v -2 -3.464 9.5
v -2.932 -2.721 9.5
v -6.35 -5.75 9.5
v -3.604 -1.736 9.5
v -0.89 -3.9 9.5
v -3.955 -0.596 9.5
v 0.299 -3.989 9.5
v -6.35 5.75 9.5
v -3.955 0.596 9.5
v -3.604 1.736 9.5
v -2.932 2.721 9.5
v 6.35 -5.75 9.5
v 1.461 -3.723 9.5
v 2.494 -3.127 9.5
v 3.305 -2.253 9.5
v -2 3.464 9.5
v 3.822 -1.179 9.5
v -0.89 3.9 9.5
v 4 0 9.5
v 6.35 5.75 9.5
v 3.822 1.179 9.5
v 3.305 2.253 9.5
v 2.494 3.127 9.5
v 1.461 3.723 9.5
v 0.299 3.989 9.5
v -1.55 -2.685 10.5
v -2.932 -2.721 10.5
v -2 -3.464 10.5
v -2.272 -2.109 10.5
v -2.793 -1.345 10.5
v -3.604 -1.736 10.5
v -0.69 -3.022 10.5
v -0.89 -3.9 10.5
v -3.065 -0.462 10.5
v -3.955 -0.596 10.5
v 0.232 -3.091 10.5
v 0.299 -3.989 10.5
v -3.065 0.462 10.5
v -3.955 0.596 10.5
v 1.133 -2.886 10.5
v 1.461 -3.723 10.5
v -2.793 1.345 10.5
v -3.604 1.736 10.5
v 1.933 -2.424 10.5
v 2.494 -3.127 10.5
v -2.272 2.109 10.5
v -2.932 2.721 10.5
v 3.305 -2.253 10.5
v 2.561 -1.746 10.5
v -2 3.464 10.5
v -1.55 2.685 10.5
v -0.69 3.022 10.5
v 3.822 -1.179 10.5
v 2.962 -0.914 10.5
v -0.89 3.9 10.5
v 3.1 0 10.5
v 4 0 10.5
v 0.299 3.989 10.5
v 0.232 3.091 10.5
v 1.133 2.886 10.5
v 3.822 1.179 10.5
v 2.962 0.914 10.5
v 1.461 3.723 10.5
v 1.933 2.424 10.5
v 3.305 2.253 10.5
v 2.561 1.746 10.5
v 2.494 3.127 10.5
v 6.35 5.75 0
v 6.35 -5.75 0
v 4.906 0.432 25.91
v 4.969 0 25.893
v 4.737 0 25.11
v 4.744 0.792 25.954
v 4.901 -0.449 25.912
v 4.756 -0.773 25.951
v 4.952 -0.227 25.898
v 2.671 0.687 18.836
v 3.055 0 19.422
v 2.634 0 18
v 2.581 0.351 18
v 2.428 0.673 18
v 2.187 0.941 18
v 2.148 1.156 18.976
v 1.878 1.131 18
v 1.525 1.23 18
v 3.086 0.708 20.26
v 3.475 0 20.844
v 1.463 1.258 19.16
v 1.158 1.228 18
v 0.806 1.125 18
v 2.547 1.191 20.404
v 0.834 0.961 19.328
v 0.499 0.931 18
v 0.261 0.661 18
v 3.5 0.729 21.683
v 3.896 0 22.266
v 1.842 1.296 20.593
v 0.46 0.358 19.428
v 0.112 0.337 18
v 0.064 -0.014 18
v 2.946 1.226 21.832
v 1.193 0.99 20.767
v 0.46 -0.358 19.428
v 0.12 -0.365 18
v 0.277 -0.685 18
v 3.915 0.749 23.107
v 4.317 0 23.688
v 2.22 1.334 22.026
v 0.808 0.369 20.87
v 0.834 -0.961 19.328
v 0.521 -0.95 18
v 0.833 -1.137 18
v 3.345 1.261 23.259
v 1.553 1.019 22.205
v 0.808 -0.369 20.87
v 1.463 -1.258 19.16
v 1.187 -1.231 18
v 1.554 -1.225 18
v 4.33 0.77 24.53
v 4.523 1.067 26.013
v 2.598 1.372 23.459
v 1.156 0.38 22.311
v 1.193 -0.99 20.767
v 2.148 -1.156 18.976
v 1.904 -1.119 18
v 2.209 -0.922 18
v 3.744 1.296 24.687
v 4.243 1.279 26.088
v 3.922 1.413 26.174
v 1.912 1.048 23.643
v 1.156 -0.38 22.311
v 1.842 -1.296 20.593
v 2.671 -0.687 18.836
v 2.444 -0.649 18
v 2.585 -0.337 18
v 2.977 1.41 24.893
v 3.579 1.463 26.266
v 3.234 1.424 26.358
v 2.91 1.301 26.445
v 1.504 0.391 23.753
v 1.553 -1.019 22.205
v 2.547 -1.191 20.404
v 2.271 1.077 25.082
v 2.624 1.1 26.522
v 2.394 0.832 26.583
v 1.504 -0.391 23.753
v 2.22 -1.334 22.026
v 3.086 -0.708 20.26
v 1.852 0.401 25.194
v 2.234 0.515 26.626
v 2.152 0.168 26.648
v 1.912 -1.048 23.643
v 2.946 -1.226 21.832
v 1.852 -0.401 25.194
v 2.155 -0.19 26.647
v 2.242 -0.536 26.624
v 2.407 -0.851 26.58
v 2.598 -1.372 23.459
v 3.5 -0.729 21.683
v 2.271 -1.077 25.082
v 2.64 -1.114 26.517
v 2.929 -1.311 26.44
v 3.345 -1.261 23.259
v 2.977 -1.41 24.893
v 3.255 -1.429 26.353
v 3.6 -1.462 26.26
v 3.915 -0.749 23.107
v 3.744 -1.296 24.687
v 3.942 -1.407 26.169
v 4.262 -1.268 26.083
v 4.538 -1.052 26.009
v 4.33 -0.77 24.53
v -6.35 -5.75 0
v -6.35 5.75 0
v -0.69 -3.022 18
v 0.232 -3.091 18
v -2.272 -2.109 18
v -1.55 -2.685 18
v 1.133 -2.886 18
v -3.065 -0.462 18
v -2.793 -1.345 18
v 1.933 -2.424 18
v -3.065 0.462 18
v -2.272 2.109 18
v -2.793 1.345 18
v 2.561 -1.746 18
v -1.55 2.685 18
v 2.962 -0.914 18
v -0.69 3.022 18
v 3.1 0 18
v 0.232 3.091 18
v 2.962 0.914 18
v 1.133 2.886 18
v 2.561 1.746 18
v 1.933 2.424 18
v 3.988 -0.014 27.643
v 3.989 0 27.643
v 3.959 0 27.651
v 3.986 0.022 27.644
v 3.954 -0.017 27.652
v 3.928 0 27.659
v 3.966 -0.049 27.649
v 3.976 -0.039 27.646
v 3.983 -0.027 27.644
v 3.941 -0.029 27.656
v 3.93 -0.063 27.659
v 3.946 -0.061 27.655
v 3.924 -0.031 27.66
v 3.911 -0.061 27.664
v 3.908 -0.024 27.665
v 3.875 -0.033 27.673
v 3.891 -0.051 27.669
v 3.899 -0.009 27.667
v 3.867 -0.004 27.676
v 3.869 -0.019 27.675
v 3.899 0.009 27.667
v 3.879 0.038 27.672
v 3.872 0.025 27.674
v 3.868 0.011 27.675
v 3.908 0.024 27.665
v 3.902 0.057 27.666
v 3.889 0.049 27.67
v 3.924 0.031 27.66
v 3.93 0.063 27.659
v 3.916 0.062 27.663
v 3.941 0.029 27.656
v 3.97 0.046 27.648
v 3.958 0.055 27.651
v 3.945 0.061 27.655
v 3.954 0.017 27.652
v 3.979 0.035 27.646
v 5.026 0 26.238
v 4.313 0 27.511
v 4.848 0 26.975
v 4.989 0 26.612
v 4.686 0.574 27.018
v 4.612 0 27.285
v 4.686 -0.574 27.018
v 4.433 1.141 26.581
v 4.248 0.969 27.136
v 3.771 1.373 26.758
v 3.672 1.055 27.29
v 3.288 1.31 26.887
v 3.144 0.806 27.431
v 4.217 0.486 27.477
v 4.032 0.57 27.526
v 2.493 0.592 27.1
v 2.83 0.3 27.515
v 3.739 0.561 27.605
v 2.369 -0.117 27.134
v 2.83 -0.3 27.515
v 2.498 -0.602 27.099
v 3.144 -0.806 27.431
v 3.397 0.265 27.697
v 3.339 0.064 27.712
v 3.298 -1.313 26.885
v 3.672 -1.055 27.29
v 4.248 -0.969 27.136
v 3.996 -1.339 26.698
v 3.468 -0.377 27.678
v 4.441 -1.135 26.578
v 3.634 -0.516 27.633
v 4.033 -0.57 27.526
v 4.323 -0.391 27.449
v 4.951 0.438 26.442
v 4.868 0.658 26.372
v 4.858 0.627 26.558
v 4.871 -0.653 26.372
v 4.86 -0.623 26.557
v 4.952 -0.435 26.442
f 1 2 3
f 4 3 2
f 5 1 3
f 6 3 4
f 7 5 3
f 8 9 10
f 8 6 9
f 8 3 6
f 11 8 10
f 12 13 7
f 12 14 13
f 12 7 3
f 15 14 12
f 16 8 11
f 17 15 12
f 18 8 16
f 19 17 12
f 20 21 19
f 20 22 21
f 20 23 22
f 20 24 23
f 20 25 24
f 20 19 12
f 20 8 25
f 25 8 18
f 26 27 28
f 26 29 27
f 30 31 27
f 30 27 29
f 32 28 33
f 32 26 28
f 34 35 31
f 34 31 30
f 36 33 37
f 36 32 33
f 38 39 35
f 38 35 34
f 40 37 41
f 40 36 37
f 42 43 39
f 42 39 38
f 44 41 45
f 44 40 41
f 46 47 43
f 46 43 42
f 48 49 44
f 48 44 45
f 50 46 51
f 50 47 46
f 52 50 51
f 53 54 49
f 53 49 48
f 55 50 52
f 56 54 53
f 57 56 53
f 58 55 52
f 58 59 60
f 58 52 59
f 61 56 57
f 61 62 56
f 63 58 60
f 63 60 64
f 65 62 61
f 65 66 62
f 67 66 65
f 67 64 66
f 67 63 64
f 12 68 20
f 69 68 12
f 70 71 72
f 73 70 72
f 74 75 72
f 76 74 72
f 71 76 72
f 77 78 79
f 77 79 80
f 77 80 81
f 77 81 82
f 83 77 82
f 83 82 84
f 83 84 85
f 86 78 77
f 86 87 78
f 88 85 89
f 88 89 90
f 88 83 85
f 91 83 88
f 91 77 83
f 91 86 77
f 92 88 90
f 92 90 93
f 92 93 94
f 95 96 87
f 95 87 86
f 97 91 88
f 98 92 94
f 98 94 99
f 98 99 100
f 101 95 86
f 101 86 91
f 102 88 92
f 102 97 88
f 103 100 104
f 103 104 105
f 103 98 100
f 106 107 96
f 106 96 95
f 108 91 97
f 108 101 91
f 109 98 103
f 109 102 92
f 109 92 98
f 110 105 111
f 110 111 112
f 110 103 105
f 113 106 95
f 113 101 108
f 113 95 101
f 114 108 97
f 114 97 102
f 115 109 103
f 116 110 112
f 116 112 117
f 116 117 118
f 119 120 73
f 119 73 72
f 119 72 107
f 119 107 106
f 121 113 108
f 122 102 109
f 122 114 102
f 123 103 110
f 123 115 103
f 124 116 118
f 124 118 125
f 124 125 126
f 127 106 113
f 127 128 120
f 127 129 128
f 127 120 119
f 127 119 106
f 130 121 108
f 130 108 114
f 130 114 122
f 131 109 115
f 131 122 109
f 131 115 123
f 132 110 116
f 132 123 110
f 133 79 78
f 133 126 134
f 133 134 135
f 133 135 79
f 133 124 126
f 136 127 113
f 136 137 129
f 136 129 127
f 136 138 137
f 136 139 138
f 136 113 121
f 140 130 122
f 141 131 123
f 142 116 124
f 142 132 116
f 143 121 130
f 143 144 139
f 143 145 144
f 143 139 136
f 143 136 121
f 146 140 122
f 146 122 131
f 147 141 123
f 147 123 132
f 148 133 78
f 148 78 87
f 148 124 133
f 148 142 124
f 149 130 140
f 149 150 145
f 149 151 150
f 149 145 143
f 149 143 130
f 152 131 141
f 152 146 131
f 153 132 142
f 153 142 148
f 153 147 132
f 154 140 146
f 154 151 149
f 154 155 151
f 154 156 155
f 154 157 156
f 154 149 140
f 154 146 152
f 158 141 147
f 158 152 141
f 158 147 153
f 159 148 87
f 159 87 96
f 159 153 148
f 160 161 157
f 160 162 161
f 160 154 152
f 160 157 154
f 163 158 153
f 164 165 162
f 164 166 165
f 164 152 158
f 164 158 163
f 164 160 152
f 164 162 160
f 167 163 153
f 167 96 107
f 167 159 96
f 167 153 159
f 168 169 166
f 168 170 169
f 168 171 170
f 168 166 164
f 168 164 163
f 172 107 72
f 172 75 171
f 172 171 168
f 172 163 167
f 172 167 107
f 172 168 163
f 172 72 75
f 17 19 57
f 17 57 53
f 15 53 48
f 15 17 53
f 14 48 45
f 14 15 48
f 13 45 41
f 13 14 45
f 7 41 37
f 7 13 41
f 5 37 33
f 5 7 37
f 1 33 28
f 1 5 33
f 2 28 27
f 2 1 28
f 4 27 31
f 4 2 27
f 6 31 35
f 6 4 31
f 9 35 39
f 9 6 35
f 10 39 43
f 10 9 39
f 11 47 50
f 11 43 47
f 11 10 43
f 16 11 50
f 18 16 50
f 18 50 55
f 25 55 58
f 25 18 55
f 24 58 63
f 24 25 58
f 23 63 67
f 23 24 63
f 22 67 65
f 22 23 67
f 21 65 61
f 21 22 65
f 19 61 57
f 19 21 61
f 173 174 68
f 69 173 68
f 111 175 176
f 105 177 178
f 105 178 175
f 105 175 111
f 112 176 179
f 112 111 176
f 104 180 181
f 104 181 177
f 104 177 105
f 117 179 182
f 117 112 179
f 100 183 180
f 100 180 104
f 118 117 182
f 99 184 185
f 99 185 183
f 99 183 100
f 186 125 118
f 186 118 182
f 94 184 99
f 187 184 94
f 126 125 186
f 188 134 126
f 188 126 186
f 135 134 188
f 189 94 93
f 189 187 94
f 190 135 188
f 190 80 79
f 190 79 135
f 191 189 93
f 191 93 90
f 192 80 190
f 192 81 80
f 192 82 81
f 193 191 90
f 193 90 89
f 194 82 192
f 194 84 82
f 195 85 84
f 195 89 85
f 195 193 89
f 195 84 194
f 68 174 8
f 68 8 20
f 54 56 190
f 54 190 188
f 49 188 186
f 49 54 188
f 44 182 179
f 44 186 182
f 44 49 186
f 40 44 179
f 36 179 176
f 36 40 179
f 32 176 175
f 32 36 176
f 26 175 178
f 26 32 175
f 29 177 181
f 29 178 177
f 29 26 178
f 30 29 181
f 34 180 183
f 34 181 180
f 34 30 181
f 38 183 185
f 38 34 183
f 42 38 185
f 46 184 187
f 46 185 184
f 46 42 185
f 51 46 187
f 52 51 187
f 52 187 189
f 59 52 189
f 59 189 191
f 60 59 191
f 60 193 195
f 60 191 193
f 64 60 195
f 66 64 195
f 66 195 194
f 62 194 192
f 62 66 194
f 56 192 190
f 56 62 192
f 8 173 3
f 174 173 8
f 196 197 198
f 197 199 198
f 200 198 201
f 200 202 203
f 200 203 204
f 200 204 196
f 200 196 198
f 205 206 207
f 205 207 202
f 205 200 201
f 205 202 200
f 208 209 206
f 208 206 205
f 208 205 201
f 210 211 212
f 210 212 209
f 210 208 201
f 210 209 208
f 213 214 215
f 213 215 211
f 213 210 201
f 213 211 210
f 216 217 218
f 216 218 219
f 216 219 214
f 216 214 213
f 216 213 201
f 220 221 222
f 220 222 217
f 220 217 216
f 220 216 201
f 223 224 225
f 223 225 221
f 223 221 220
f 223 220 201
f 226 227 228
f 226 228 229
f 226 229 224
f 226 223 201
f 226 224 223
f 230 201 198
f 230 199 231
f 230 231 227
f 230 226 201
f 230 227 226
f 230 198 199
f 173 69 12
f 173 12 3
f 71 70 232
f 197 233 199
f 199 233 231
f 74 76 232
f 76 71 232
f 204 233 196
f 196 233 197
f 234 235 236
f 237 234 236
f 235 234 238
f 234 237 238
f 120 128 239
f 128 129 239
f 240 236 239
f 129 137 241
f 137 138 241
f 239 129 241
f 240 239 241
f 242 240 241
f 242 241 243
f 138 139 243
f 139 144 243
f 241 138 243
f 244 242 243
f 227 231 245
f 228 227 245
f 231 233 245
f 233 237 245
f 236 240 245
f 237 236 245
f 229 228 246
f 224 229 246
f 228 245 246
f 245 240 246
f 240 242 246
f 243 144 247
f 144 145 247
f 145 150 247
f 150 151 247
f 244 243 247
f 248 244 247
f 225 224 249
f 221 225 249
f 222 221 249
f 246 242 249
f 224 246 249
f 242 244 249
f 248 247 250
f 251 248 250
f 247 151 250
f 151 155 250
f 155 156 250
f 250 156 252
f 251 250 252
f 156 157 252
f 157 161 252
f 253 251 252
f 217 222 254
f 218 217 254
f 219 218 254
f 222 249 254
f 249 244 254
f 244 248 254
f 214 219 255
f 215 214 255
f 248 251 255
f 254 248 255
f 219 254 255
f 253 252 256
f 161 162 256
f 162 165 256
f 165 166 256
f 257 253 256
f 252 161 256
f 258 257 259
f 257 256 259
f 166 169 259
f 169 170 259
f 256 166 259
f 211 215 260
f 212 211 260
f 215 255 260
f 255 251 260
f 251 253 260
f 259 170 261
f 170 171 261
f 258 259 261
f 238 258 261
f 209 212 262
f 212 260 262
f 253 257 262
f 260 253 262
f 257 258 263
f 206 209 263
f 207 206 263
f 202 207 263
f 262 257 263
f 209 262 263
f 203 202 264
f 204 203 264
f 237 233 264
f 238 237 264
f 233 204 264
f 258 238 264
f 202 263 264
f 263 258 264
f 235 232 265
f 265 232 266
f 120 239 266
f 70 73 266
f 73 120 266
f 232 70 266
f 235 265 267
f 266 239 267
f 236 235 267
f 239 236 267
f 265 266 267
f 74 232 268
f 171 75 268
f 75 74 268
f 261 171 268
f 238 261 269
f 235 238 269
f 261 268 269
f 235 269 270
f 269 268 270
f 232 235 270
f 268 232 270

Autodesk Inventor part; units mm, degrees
ref_plane "YZ Plane" through (0, 0, 0) normal (1, 0, 0) x (0, 1, 0)
ref_plane "XZ Plane" through (0, 0, 0) normal (0, 1, 0) x (-1, 0, 0)
ref_plane "XY Plane" through (0, 0, 0) normal (0, 0, 1) x (1, 0, 0)
sketch "Sketch1" plane through (0, 0, 0) normal (0, 0, 1) x (1, 0, 0)
  line L0 (-8.89, 0) -> (8.89, 0) construction
  line L1 (0, -8.05) -> (0, 8.05) construction
  line L2 (-6.35, 5.75) -> (6.35, 5.75)
  line L3 (6.35, 5.75) -> (6.35, -5.75)
  line L4 (6.35, -5.75) -> (-6.35, -5.75)
  line L5 (-6.35, -5.75) -> (-6.35, 5.75)
  point P0 (0, 0)
  point P1 (0, 5.75)
  point P2 (6.35, 0)
  dimension "d0" = 12.7
  dimension "d1" = 11.5
extrude "Extrusion1" add sketch "Sketch1" along normal blind 9.5
sketch "Sketch2" plane through (0, 0, 9.5) normal (0, 0, 1) x (1, 0, 0)
  circle A0 centre (0, 0) radius 4
  dimension "d4" = 8
extrude "Extrusion2" add sketch "Sketch2" along normal blind 1
sketch "Sketch3" plane through (0, 0, 10.5) normal (0, 0, 1) x (1, 0, 0)
  circle A0 centre (0, 0) radius 3.1
  dimension "d7" = 6.2
extrude "Extrusion3" add sketch "Sketch3" along normal blind 7.5
sketch "Sketch4" plane through (0, 0, 0) normal (0, 1, 0) x (-1, 0, 0)
  line L0 (8.89, 0) -> (-8.89, 0) construction
  line L1 (0, -3.6) -> (0, 21.6) construction
  line L2 (0, 13) -> (-4.5899, 30.1296) construction
  line L3 (3.1, 18) -> (-3.1, 18) construction
  line L4 (-1.2212, 17.5575) -> (-2.4088, 17.2393)
  line L5 (-2.4088, 17.2393) -> (-5.3768, 27.271)
  line L6 (-5.3768, 27.271) -> (-3.9279, 27.6593)
  line L7 (-3.9279, 27.6593) -> (-1.2212, 17.5575)
  point P0 (0, 0)
  point P1 (-1.3397, 18)
  point P2 (-2.6338, 18)
  dimension "d10" = 15
  dimension "d11" = 5
  dimension "d13" = 10
  dimension "d14" = 3
  dimension "d16" = 2.5
revolve "Revolution1" add sketch "Sketch4" angle 360 about axis through (0, 0, 13) along (0.258819, 0, 0.9659258)
fillet "Fillet1" radius 1.4 1 edges at (2.479, 0, 28.0475)
properties part number "F112"
